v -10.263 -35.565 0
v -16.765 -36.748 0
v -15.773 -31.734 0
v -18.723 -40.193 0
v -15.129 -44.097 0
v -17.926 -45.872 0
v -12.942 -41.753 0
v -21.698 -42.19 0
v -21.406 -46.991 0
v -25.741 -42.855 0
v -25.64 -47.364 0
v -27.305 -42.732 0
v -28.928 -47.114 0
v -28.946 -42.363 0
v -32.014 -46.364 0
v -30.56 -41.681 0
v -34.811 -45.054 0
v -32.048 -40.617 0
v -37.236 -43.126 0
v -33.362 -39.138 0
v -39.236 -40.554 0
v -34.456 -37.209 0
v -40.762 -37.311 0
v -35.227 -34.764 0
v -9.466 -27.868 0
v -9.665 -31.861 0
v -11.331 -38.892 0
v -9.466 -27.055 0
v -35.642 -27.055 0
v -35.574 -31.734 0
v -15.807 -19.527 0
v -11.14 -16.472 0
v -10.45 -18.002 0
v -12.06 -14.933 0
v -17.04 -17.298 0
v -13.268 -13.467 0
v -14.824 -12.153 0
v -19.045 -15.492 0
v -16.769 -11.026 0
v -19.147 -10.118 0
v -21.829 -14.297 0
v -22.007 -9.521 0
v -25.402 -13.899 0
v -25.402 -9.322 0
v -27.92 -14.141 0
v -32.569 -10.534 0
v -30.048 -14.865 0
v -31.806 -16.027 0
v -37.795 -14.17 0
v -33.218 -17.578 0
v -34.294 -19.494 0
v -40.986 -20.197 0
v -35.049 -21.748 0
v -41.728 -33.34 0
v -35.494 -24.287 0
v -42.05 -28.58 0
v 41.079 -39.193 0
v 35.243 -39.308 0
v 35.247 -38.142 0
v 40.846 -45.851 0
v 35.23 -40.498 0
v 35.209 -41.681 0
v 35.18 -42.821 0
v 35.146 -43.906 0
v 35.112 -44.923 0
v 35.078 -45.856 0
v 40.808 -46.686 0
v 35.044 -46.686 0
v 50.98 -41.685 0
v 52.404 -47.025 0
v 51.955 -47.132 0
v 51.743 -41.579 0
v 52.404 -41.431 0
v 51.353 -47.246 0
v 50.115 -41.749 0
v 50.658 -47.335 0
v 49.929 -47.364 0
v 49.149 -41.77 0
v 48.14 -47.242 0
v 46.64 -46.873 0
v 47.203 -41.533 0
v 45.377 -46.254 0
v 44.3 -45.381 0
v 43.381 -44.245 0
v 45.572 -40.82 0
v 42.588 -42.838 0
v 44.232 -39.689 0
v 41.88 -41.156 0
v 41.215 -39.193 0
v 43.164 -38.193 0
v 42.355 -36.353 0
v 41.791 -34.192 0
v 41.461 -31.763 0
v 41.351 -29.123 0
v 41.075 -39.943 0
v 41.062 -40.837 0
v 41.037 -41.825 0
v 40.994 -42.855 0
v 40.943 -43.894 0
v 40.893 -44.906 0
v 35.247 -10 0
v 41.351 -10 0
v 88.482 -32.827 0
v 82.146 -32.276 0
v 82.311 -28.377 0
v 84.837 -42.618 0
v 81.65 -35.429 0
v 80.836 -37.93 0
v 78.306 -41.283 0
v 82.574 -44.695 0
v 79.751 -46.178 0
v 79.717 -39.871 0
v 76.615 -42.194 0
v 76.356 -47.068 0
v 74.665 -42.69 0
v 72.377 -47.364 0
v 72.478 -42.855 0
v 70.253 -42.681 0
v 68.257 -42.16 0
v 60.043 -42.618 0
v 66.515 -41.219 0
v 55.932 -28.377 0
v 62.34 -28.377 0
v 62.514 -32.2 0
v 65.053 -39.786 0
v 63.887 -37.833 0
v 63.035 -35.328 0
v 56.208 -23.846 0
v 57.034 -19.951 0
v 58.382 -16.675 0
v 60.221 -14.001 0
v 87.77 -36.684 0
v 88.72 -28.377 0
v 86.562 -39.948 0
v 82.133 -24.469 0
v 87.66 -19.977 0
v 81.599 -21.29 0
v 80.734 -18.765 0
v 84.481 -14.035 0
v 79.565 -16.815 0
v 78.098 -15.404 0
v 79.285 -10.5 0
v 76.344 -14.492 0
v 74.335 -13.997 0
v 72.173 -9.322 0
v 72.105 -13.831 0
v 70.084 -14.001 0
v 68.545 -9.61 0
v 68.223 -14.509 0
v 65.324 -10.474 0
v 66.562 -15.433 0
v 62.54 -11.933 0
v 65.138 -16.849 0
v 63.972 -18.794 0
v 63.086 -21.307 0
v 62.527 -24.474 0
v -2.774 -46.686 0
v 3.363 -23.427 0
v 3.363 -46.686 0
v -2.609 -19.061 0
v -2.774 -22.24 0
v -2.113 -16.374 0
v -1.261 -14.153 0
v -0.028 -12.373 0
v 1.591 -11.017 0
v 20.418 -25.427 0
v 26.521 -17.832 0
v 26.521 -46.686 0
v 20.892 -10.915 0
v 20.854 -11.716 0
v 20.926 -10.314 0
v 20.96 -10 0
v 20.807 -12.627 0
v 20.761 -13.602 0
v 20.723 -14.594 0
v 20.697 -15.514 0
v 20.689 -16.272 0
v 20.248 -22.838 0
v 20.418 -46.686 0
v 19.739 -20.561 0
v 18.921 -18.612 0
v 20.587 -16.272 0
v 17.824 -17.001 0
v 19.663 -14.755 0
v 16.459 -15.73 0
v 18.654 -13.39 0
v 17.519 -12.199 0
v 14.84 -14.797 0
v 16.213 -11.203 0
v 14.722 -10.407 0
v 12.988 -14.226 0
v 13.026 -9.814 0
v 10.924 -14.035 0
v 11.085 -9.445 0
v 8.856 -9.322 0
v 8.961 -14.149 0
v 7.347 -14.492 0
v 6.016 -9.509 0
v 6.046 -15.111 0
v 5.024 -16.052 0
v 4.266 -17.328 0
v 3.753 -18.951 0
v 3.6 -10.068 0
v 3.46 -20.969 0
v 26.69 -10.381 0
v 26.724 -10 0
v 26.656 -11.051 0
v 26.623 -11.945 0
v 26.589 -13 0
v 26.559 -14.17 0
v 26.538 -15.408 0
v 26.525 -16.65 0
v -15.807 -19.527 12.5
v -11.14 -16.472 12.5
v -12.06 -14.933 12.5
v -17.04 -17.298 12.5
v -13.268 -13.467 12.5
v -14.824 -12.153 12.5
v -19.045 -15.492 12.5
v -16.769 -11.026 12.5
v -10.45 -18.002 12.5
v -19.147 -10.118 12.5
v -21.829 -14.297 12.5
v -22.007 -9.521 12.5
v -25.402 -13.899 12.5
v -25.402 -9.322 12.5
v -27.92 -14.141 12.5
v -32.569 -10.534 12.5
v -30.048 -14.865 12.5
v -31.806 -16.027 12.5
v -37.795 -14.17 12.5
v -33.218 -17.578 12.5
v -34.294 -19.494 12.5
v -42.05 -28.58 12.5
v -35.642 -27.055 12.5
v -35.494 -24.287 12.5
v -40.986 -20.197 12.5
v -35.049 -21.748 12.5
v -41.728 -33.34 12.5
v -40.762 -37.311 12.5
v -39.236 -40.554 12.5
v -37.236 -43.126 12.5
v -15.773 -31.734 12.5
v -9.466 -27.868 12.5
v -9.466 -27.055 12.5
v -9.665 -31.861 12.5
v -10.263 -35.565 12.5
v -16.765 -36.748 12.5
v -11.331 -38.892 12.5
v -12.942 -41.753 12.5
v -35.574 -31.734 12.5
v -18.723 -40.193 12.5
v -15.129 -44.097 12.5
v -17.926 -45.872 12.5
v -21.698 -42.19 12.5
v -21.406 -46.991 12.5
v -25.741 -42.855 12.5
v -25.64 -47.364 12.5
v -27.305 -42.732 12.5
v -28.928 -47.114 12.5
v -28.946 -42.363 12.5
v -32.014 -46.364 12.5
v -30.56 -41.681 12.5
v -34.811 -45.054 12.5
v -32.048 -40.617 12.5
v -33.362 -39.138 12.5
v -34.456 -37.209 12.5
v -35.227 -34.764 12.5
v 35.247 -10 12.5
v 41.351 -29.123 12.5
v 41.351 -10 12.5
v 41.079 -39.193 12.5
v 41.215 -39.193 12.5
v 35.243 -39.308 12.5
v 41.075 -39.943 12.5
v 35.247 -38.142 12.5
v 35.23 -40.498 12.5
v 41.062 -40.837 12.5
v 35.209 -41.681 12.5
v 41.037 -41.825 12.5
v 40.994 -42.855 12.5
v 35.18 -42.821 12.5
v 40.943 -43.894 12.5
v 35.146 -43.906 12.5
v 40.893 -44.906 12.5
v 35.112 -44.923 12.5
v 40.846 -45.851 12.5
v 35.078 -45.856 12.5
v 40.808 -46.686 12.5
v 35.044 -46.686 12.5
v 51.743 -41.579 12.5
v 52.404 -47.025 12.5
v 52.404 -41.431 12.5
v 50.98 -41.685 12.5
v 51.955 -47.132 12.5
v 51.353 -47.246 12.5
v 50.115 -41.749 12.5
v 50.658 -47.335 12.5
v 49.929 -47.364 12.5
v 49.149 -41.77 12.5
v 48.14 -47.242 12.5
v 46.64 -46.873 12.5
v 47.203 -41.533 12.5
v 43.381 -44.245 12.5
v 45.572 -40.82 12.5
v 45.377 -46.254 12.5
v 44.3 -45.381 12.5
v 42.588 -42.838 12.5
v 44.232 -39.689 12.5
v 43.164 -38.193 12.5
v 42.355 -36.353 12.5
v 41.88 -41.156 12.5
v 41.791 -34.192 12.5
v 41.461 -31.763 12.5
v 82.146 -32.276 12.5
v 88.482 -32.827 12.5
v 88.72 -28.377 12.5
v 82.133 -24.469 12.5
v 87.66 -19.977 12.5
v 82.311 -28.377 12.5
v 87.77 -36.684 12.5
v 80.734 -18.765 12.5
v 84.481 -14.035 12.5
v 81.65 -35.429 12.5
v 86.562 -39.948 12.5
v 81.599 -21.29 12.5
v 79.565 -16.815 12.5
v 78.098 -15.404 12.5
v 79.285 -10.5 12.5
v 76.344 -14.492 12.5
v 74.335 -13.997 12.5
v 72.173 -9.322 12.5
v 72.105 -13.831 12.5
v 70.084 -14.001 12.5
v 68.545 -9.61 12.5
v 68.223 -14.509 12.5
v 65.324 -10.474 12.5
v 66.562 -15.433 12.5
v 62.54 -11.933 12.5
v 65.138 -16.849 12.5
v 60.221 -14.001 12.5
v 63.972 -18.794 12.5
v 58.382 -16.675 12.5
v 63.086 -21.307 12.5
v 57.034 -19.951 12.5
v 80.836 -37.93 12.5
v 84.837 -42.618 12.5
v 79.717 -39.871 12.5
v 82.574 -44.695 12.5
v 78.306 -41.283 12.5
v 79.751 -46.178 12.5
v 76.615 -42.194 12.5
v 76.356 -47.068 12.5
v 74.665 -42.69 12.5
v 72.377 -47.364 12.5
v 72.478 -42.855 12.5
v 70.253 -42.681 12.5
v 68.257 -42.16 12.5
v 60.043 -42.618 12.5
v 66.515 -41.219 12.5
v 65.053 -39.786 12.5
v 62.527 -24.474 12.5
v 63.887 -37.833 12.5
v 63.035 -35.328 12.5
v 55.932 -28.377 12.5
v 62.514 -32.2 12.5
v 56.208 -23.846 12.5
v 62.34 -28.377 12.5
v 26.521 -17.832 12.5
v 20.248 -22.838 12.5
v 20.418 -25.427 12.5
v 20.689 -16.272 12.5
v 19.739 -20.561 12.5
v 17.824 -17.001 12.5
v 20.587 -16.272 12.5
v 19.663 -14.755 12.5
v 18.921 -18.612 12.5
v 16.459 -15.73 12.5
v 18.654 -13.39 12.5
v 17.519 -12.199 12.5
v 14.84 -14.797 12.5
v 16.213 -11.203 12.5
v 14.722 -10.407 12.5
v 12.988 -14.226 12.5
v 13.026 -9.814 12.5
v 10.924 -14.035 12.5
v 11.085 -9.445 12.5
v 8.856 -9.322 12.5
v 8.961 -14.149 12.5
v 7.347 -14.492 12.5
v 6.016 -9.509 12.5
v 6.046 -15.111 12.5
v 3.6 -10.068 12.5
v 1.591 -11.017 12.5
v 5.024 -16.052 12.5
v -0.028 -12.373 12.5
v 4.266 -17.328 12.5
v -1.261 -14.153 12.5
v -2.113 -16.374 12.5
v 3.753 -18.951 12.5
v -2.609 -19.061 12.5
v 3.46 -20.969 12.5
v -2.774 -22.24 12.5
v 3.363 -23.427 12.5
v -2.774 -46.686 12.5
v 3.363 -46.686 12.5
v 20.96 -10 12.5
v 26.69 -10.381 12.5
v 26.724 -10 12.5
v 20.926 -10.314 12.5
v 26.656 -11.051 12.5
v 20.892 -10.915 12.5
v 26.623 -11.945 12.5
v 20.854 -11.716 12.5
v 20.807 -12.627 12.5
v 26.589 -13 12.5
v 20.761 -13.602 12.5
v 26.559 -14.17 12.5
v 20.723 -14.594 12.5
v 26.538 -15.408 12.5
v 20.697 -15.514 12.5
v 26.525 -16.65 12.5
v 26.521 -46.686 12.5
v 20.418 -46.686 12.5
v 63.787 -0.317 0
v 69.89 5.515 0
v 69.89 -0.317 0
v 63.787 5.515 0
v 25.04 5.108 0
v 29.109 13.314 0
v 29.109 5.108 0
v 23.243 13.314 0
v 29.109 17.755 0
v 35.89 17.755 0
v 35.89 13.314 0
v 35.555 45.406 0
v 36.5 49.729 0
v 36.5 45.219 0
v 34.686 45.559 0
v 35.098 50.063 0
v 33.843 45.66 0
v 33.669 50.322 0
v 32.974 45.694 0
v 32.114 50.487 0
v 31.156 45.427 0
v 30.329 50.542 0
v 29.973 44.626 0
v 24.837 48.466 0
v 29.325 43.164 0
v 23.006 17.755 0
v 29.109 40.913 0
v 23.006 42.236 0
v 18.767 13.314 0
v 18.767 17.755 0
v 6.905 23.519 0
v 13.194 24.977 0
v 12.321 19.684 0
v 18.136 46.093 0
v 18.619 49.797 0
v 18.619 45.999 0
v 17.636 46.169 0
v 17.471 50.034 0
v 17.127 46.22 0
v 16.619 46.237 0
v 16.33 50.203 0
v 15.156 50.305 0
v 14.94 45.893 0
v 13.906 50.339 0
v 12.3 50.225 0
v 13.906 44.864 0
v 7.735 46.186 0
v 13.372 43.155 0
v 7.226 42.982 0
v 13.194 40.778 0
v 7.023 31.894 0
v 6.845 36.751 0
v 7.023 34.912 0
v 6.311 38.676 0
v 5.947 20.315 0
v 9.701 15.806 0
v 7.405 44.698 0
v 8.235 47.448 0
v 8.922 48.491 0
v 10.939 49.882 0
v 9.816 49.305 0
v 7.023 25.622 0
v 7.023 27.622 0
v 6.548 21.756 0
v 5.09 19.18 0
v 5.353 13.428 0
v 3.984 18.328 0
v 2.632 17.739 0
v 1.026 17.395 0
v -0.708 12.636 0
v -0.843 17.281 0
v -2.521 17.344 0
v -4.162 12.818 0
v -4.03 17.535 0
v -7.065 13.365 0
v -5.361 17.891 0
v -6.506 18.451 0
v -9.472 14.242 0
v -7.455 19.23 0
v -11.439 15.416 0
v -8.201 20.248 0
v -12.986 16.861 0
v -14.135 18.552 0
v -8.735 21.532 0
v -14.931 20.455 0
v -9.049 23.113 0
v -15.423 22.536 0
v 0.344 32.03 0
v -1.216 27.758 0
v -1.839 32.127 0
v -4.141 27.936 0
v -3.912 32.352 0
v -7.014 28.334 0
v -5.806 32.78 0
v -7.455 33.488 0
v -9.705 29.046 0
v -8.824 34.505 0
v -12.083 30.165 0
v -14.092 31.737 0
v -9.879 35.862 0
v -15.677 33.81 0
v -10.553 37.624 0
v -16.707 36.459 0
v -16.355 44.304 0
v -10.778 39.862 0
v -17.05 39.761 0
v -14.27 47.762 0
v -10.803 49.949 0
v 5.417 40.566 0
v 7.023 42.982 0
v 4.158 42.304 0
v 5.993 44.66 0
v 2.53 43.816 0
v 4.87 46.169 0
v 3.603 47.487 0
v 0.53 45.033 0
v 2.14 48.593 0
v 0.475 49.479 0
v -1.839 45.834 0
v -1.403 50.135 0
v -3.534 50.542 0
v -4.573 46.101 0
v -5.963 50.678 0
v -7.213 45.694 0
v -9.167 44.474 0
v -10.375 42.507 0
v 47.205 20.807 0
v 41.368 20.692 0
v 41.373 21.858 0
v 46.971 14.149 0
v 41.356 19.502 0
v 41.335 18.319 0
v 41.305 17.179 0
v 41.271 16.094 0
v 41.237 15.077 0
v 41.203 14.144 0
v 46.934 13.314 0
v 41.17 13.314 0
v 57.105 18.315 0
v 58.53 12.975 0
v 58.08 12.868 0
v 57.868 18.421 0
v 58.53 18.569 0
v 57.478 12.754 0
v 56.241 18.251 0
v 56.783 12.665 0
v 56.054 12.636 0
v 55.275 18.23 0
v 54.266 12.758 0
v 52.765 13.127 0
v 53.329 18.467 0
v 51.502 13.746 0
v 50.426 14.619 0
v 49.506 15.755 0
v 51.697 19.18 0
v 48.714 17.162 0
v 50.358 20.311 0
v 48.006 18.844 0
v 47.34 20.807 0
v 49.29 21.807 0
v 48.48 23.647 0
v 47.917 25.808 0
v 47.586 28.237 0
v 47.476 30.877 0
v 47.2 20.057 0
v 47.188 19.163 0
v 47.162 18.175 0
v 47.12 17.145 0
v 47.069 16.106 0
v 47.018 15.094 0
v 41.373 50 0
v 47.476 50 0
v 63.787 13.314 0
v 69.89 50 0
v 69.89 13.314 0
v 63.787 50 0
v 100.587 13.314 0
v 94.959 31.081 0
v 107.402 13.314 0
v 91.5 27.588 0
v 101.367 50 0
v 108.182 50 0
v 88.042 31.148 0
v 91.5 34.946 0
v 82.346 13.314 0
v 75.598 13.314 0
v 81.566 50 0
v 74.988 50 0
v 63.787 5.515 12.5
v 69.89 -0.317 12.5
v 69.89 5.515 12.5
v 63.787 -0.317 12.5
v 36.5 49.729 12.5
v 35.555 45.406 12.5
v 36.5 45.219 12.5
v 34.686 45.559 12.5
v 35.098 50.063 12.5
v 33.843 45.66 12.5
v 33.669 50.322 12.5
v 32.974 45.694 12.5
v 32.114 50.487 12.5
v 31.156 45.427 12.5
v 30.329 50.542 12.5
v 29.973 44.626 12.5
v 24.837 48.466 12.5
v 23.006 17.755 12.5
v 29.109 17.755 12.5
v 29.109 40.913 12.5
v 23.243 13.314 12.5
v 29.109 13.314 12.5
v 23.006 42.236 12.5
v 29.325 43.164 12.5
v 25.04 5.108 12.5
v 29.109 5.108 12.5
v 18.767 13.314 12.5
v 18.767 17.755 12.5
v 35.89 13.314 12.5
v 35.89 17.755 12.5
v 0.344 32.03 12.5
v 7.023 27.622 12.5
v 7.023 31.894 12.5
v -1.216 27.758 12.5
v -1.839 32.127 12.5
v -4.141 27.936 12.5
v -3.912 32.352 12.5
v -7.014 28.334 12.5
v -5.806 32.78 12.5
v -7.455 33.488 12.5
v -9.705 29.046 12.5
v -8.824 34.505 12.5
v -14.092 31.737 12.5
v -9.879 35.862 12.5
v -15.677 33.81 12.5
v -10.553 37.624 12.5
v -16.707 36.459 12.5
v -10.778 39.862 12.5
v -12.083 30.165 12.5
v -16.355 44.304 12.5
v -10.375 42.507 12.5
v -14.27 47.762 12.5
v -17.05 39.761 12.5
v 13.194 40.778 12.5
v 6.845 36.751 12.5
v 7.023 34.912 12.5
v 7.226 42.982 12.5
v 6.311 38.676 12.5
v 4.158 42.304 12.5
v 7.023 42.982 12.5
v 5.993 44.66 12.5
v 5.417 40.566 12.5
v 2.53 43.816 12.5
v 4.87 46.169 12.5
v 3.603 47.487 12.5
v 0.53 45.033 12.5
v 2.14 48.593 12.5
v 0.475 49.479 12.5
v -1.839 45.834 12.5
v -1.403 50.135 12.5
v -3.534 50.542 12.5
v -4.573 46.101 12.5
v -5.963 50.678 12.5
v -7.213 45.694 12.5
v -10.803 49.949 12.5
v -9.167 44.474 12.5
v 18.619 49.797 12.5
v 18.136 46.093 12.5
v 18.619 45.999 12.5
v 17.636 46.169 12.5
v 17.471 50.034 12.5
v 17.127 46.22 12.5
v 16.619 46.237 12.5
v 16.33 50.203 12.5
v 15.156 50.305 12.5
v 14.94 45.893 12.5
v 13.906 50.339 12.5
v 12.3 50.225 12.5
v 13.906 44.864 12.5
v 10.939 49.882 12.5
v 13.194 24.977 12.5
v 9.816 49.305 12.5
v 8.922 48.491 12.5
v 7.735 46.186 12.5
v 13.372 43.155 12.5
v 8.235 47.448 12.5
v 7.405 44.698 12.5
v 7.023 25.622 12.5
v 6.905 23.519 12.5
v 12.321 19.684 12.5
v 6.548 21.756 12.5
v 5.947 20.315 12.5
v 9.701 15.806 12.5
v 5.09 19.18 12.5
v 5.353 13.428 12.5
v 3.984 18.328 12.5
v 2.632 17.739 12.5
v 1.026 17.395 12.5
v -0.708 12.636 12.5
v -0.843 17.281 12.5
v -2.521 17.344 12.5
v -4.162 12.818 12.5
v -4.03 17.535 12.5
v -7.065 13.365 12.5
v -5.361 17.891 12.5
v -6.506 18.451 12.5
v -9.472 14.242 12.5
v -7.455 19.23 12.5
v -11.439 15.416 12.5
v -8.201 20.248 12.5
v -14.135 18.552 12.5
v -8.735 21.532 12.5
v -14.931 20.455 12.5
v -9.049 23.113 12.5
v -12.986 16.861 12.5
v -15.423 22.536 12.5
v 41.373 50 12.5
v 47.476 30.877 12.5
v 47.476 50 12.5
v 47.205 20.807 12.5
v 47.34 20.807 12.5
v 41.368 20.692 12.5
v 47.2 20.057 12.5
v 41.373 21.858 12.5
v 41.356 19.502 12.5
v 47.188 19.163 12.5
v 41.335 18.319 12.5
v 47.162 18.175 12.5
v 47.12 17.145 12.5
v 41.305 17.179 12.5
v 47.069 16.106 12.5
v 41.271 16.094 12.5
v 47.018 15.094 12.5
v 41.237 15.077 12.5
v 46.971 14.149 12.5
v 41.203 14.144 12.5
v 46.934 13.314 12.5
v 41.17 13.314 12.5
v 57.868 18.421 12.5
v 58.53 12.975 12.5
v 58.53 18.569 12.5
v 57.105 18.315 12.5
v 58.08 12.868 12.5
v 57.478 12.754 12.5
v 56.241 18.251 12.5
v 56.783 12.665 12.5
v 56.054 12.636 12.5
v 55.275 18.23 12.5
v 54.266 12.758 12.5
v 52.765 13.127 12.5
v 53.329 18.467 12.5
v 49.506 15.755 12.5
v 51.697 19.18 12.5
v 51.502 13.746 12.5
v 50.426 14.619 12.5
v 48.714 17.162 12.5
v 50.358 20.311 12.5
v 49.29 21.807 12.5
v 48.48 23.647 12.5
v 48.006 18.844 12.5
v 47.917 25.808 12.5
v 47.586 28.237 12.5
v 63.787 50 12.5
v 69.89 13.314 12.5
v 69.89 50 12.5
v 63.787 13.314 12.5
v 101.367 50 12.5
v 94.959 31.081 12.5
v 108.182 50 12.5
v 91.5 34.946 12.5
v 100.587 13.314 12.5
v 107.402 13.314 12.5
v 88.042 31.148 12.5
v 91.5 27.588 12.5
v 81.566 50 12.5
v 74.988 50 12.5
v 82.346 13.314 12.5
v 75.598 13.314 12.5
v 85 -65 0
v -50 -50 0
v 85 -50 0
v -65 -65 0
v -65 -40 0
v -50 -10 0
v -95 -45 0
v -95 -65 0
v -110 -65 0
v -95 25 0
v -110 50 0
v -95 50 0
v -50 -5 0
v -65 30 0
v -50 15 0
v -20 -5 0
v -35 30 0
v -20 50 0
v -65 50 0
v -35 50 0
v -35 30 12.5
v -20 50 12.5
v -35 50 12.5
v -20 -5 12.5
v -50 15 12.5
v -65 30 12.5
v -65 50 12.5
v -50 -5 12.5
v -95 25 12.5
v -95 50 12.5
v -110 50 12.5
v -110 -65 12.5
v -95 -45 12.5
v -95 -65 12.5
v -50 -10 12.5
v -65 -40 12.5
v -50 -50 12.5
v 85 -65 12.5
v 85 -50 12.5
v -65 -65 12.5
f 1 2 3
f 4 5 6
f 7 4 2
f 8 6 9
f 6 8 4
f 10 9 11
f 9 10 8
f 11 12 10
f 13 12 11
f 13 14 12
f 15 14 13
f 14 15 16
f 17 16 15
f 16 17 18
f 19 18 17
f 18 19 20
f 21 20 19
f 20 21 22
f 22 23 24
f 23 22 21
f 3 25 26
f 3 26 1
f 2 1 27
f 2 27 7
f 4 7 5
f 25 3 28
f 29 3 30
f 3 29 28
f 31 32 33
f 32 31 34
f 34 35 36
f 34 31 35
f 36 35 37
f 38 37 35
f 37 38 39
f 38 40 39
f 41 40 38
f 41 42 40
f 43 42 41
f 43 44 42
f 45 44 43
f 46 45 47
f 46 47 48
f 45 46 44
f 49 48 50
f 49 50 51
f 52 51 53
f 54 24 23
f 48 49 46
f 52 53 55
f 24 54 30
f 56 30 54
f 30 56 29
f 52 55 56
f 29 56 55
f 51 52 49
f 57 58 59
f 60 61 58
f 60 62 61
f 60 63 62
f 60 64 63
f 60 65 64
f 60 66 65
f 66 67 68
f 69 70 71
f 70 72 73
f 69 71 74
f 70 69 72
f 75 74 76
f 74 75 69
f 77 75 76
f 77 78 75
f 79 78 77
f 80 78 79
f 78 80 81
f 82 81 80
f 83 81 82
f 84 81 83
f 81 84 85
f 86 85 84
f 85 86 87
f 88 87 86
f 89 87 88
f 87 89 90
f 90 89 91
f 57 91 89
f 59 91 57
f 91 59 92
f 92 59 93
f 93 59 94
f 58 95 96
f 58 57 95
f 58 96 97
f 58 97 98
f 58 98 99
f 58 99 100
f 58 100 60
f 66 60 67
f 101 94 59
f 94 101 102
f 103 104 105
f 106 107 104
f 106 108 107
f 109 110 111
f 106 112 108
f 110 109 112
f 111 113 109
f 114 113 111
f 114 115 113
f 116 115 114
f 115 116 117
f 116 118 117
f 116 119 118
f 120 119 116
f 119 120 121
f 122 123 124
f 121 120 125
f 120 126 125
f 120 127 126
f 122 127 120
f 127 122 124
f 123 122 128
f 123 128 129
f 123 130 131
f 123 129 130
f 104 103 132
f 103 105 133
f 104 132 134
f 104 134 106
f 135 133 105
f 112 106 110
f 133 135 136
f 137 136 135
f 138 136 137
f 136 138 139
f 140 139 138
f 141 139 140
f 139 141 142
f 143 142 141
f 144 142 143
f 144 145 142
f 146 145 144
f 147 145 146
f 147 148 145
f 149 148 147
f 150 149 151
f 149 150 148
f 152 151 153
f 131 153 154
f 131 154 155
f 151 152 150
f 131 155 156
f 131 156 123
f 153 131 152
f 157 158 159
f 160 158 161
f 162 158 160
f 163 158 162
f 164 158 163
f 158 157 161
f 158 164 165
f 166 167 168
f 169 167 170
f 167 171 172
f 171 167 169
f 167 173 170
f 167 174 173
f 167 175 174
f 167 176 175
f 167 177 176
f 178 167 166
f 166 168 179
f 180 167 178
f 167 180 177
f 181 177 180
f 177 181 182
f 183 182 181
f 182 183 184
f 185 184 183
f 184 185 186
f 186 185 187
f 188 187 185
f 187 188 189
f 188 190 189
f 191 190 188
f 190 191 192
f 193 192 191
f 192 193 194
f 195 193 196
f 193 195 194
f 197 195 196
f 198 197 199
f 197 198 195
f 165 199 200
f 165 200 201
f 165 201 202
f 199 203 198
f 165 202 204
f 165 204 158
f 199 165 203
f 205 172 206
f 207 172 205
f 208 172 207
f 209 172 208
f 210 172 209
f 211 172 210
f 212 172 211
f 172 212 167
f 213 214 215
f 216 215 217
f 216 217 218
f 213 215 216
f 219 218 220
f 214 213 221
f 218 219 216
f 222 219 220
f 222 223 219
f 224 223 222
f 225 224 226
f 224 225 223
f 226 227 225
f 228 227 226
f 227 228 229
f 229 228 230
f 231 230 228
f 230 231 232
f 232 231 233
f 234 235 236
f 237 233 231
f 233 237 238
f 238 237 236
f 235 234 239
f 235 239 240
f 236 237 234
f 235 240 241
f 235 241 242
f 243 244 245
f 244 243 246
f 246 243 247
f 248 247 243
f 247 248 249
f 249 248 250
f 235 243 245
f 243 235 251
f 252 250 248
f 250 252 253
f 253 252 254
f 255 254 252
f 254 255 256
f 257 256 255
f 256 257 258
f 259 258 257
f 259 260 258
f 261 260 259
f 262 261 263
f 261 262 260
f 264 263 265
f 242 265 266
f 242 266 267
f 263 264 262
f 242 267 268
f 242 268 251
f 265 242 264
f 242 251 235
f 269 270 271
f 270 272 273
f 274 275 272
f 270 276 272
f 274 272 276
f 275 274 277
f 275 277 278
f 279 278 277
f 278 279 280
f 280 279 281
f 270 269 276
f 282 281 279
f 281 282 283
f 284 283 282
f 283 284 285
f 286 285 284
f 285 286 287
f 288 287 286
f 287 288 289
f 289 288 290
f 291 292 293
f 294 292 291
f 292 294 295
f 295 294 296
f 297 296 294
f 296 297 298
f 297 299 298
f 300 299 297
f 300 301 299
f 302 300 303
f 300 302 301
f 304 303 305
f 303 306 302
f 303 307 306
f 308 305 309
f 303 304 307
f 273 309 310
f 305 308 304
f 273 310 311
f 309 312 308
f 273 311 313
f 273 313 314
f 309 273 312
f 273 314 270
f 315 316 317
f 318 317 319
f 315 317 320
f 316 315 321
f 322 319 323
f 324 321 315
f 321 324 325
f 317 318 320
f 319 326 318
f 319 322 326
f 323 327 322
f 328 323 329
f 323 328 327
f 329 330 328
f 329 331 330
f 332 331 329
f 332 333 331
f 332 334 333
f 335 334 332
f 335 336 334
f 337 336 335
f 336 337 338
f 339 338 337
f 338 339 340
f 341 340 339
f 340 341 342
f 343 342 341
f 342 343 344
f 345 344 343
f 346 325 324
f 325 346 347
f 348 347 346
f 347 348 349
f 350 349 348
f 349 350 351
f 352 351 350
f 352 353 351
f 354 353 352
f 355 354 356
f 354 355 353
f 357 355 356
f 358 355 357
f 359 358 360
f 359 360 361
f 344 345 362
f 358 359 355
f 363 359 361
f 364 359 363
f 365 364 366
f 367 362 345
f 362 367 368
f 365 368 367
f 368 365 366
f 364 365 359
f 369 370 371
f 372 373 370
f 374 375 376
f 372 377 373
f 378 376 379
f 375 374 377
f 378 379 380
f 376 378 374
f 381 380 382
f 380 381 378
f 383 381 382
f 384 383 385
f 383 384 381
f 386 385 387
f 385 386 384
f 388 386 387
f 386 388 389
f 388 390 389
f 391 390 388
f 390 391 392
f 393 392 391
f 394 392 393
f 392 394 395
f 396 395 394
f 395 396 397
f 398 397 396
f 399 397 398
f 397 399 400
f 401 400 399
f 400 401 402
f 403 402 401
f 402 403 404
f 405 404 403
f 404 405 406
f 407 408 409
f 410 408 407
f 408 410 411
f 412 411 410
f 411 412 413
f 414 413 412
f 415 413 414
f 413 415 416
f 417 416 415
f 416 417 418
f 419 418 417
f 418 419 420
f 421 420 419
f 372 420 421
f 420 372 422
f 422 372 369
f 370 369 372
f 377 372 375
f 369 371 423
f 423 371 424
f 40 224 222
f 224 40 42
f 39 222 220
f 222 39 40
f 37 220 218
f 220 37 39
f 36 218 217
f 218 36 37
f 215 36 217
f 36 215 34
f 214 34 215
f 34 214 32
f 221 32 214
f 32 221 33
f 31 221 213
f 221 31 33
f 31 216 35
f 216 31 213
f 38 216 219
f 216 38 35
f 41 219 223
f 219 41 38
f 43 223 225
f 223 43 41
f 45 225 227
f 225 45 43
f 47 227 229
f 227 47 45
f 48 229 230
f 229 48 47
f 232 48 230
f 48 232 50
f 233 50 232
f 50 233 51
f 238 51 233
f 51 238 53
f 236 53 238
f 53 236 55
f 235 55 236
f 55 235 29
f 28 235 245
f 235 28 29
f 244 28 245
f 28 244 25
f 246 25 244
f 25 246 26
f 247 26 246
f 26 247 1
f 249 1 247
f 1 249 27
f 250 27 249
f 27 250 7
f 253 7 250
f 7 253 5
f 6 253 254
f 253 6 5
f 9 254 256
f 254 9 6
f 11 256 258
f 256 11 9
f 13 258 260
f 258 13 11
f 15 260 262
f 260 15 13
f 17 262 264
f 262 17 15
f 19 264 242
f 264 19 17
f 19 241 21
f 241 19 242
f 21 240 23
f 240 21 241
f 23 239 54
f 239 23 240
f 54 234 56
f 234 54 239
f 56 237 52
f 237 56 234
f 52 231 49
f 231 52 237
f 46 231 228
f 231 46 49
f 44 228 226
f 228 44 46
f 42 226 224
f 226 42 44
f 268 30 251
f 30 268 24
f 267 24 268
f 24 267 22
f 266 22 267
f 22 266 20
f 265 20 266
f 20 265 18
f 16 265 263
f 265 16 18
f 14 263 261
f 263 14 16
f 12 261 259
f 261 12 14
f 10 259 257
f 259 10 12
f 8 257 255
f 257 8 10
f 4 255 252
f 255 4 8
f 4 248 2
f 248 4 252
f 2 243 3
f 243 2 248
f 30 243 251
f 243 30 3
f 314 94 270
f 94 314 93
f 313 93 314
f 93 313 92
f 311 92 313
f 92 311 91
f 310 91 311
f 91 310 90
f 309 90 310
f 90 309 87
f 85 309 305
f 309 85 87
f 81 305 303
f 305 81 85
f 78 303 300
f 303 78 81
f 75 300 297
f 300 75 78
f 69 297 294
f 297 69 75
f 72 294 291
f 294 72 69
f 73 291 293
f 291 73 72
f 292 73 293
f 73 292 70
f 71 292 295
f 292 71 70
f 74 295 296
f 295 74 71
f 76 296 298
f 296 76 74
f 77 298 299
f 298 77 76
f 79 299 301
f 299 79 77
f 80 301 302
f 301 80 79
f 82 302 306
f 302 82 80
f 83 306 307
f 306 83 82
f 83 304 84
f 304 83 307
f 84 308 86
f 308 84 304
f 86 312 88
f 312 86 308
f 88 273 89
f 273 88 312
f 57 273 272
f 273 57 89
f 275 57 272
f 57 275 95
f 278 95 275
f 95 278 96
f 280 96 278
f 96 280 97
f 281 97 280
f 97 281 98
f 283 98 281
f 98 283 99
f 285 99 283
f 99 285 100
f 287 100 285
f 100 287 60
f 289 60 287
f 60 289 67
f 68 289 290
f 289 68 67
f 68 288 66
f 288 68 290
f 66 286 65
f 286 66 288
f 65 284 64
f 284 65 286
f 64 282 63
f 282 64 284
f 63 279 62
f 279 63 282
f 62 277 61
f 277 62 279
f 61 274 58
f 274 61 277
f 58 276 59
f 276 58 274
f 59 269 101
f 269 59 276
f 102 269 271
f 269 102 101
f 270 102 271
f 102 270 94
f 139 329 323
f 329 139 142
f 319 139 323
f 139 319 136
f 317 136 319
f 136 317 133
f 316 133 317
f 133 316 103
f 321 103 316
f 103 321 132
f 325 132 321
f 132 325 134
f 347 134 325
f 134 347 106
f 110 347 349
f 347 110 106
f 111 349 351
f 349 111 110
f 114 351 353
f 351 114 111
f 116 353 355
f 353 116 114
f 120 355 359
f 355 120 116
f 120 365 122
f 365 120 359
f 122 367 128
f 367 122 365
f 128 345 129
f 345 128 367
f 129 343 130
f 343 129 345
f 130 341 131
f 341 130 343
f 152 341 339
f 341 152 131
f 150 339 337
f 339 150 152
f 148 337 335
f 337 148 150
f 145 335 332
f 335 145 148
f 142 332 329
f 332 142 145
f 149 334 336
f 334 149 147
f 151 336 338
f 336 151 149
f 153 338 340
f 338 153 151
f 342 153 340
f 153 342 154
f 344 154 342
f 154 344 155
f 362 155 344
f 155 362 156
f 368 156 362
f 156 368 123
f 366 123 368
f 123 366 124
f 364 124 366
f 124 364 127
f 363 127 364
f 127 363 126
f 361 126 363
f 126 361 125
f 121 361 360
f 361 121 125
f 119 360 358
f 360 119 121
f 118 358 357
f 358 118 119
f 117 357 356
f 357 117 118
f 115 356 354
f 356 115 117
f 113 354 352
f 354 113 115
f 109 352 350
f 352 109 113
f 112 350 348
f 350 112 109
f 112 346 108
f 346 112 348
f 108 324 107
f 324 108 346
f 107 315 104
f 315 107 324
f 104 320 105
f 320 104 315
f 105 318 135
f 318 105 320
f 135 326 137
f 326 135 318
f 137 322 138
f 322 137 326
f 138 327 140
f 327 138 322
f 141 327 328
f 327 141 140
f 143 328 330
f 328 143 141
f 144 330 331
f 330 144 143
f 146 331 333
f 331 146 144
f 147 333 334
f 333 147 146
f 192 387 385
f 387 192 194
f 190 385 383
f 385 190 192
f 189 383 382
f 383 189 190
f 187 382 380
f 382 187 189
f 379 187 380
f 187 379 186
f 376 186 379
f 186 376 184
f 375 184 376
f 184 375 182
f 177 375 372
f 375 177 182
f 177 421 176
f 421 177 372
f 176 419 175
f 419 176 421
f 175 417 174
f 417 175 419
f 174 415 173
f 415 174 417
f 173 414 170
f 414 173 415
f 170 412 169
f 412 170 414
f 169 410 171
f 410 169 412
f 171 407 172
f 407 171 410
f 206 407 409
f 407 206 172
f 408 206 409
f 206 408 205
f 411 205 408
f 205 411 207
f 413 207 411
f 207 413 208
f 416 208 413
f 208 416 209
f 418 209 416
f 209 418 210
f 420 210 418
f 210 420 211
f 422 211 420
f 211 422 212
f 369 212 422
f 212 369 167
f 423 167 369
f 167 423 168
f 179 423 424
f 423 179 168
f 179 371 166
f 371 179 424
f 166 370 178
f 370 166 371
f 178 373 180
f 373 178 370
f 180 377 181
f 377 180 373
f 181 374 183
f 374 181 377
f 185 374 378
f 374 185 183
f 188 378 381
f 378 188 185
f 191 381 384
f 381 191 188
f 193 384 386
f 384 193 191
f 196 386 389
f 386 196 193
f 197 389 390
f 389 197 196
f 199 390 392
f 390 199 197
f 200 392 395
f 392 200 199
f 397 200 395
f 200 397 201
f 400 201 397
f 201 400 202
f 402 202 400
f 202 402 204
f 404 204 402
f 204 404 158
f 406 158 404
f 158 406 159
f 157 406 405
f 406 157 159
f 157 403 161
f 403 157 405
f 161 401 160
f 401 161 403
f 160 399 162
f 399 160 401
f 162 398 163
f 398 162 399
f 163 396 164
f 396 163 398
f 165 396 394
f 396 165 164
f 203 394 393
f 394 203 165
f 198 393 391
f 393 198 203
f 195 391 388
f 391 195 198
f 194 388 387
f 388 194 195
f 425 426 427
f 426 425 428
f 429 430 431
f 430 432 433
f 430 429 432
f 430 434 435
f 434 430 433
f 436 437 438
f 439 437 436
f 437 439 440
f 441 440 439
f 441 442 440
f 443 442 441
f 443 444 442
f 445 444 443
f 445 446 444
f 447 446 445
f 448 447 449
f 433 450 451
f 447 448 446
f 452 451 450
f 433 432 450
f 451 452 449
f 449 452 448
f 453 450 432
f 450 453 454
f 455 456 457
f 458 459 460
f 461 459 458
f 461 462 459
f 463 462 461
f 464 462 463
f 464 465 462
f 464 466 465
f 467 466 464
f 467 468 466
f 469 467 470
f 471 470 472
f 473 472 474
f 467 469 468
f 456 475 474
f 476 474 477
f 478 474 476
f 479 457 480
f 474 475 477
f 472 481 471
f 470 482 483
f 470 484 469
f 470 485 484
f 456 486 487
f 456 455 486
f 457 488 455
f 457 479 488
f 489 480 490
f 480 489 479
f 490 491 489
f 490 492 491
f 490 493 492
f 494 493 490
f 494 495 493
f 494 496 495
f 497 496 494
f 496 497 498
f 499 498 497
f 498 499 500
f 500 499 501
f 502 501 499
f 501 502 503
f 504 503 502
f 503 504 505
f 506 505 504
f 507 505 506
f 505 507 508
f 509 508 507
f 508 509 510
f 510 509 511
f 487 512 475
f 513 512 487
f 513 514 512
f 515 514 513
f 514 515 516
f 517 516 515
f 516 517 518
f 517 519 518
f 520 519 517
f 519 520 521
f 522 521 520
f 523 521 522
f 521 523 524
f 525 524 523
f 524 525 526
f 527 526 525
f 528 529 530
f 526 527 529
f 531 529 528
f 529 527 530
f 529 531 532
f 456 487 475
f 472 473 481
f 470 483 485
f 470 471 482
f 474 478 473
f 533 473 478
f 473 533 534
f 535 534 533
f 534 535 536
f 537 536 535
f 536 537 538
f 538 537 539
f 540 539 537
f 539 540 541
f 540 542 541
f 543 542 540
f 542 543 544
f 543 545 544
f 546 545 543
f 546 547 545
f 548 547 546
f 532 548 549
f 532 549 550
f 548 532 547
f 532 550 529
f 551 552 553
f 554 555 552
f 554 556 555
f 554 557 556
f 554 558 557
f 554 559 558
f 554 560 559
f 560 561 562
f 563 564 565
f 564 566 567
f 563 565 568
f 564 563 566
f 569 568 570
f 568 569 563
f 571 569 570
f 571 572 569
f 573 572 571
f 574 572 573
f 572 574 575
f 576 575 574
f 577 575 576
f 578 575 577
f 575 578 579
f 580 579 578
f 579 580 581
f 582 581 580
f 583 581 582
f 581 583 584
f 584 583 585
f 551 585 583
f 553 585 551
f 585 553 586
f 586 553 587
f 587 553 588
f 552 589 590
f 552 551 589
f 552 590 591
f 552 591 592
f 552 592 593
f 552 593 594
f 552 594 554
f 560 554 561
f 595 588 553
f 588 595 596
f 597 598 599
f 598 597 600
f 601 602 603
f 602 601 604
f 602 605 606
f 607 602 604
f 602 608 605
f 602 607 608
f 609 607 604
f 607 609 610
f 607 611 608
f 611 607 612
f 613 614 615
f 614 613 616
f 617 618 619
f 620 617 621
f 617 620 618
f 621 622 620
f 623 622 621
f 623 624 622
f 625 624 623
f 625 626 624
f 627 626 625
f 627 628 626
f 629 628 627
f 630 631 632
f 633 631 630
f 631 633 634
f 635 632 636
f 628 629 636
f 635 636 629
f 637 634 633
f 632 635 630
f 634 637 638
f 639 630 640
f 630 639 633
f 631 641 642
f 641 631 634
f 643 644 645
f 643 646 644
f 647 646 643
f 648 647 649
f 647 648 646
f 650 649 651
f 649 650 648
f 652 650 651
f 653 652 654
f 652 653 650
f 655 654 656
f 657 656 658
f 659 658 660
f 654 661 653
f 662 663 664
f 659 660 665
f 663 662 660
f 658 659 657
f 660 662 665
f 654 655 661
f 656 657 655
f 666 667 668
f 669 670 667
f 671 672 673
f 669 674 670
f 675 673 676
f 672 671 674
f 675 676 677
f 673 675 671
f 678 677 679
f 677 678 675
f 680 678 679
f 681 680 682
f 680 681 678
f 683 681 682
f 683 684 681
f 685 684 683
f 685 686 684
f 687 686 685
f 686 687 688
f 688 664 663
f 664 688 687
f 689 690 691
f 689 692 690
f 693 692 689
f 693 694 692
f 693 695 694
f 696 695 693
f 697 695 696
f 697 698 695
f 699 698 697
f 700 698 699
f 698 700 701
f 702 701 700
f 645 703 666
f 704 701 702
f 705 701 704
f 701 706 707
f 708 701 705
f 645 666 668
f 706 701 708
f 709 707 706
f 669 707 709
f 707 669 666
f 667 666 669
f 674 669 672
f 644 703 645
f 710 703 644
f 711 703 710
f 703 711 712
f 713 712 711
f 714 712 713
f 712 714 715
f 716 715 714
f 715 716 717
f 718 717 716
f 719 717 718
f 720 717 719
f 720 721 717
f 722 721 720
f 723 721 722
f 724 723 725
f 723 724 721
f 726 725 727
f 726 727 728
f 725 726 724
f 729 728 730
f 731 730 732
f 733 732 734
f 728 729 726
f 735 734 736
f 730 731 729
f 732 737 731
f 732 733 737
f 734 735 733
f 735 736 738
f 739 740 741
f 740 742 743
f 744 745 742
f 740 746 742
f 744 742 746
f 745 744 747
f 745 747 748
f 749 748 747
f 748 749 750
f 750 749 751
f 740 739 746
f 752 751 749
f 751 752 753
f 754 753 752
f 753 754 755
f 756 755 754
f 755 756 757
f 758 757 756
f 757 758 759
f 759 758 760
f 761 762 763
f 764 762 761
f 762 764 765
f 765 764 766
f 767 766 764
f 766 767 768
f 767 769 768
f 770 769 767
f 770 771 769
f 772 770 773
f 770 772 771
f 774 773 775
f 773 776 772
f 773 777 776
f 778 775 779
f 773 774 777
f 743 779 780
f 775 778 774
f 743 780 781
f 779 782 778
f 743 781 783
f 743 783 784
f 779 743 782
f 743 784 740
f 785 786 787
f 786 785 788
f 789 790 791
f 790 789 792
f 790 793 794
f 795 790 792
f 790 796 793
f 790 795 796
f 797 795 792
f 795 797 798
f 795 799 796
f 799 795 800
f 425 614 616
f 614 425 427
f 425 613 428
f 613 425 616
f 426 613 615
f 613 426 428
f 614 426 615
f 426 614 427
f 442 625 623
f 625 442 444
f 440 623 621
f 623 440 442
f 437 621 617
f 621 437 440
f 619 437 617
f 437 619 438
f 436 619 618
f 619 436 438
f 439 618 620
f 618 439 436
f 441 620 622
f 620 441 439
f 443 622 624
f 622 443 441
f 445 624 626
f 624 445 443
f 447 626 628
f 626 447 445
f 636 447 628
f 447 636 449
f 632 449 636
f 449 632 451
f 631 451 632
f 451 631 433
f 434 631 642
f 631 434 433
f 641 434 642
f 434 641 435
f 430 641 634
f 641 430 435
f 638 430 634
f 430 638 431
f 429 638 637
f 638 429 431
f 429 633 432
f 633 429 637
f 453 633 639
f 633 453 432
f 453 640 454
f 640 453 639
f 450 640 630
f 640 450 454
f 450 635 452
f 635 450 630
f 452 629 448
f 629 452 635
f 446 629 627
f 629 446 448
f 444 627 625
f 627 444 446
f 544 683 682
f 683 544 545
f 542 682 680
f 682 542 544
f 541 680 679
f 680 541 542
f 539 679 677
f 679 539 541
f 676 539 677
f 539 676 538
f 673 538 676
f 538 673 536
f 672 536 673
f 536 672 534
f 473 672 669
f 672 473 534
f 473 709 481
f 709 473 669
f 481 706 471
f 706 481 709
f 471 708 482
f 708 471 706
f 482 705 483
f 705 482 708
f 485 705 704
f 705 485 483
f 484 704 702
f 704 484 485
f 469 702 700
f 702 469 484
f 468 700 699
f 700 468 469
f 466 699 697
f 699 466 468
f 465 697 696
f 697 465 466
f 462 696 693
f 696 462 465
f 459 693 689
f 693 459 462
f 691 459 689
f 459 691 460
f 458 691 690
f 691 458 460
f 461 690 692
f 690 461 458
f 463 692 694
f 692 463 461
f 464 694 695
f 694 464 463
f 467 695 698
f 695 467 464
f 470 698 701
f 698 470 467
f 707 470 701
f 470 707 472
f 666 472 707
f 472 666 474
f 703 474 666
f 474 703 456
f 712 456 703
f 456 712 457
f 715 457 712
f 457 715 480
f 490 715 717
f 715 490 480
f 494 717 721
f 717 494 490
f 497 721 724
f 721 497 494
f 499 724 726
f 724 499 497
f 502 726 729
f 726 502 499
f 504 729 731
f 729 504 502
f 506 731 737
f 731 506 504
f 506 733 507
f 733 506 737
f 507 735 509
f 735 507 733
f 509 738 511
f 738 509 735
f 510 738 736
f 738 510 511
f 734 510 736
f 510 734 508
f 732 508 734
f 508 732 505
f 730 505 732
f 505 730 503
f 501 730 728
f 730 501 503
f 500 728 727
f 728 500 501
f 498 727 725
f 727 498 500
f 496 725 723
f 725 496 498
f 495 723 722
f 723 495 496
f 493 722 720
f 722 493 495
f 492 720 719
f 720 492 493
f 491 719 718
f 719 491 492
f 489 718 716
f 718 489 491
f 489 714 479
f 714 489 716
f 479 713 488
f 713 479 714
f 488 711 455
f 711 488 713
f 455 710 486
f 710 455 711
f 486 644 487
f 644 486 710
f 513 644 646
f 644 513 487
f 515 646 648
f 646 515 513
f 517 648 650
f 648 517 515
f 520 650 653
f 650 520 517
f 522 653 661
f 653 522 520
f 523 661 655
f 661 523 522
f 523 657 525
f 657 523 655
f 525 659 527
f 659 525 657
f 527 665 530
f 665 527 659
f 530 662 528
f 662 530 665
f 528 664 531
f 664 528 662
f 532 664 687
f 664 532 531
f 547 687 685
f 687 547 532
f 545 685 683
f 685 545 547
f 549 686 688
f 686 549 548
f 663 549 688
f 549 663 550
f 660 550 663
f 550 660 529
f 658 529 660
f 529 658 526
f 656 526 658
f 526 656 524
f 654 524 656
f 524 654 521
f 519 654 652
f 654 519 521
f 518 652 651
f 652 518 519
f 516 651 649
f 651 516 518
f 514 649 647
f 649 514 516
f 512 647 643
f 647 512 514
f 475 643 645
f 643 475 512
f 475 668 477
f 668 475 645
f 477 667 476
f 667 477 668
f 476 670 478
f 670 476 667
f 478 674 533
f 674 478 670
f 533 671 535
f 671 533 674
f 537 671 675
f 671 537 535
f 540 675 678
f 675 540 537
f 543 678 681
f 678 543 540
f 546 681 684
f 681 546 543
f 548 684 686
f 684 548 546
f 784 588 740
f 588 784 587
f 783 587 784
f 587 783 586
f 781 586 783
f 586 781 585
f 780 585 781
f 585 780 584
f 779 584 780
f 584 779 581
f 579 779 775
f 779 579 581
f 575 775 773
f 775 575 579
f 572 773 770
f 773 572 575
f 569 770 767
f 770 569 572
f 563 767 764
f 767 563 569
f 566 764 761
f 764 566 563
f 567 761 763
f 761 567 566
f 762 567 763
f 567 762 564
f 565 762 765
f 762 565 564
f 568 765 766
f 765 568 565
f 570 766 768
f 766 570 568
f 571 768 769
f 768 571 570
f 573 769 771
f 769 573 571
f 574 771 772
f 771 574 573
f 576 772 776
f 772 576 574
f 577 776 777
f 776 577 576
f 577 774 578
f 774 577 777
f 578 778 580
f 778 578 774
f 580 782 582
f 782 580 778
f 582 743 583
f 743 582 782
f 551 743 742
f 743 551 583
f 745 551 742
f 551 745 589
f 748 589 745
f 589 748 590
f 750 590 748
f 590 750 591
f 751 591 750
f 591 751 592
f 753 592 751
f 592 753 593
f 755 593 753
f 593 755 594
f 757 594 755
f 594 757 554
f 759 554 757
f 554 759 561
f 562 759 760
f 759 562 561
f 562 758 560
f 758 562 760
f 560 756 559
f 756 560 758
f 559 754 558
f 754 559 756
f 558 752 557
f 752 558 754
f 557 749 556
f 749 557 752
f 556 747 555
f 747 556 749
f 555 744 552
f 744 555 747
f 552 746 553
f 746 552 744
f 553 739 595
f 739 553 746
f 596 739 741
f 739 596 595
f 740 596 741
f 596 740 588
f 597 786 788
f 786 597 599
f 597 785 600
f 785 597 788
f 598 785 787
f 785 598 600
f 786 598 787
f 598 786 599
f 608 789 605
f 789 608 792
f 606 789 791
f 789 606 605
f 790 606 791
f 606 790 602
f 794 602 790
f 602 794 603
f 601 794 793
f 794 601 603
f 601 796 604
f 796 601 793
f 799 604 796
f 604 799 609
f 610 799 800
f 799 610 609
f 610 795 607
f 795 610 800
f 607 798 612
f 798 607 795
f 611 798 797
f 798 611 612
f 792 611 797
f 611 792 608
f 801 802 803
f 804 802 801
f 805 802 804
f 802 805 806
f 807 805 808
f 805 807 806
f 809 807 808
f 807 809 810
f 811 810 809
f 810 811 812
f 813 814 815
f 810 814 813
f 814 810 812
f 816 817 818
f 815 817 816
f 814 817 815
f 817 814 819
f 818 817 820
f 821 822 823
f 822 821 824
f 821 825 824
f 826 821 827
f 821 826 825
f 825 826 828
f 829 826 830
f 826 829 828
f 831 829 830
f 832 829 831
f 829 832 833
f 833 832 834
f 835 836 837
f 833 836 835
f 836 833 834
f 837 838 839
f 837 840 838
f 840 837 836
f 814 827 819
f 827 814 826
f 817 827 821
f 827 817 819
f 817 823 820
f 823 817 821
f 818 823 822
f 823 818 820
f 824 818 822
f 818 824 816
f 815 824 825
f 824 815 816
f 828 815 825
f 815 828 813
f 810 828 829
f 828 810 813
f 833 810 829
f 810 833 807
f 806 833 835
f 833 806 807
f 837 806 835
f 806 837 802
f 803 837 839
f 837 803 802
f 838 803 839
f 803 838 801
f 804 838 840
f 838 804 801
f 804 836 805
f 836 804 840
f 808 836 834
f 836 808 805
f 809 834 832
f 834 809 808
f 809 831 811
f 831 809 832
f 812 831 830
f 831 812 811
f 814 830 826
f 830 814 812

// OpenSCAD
//$fa = 20;
$fn = 1;
//rotate([17,0,0])
//translate([-200,0,0])

//cube([10,10,10]);
//sphere(10);

mirror([0,1,0])
scale([5,5,5])

translate([-22,-10,0])
union(){
translate([13,12,0]) linear_extrude(height = 2.5) text("euro");

translate([18,0,0]) linear_extrude(height = 2.5)text("atrix");

linear_extrude(height = 2.5)
//polygon([[20,0],[20,20],[10,10],[10,20],[4,10],[4,40],[0,40],[0,0],[4,0],[10,10],[10,0]]);
polygon([[18,0],[18,11],[12,7],[12,11],[3,5],[3,19],[12,12],[12,20],[39,20],[39,23],[9,23],[9,18],[3,23],[0,23],[0,0],[3,0],[9,4],[9,0],[15,4],[15,0]]);
}
